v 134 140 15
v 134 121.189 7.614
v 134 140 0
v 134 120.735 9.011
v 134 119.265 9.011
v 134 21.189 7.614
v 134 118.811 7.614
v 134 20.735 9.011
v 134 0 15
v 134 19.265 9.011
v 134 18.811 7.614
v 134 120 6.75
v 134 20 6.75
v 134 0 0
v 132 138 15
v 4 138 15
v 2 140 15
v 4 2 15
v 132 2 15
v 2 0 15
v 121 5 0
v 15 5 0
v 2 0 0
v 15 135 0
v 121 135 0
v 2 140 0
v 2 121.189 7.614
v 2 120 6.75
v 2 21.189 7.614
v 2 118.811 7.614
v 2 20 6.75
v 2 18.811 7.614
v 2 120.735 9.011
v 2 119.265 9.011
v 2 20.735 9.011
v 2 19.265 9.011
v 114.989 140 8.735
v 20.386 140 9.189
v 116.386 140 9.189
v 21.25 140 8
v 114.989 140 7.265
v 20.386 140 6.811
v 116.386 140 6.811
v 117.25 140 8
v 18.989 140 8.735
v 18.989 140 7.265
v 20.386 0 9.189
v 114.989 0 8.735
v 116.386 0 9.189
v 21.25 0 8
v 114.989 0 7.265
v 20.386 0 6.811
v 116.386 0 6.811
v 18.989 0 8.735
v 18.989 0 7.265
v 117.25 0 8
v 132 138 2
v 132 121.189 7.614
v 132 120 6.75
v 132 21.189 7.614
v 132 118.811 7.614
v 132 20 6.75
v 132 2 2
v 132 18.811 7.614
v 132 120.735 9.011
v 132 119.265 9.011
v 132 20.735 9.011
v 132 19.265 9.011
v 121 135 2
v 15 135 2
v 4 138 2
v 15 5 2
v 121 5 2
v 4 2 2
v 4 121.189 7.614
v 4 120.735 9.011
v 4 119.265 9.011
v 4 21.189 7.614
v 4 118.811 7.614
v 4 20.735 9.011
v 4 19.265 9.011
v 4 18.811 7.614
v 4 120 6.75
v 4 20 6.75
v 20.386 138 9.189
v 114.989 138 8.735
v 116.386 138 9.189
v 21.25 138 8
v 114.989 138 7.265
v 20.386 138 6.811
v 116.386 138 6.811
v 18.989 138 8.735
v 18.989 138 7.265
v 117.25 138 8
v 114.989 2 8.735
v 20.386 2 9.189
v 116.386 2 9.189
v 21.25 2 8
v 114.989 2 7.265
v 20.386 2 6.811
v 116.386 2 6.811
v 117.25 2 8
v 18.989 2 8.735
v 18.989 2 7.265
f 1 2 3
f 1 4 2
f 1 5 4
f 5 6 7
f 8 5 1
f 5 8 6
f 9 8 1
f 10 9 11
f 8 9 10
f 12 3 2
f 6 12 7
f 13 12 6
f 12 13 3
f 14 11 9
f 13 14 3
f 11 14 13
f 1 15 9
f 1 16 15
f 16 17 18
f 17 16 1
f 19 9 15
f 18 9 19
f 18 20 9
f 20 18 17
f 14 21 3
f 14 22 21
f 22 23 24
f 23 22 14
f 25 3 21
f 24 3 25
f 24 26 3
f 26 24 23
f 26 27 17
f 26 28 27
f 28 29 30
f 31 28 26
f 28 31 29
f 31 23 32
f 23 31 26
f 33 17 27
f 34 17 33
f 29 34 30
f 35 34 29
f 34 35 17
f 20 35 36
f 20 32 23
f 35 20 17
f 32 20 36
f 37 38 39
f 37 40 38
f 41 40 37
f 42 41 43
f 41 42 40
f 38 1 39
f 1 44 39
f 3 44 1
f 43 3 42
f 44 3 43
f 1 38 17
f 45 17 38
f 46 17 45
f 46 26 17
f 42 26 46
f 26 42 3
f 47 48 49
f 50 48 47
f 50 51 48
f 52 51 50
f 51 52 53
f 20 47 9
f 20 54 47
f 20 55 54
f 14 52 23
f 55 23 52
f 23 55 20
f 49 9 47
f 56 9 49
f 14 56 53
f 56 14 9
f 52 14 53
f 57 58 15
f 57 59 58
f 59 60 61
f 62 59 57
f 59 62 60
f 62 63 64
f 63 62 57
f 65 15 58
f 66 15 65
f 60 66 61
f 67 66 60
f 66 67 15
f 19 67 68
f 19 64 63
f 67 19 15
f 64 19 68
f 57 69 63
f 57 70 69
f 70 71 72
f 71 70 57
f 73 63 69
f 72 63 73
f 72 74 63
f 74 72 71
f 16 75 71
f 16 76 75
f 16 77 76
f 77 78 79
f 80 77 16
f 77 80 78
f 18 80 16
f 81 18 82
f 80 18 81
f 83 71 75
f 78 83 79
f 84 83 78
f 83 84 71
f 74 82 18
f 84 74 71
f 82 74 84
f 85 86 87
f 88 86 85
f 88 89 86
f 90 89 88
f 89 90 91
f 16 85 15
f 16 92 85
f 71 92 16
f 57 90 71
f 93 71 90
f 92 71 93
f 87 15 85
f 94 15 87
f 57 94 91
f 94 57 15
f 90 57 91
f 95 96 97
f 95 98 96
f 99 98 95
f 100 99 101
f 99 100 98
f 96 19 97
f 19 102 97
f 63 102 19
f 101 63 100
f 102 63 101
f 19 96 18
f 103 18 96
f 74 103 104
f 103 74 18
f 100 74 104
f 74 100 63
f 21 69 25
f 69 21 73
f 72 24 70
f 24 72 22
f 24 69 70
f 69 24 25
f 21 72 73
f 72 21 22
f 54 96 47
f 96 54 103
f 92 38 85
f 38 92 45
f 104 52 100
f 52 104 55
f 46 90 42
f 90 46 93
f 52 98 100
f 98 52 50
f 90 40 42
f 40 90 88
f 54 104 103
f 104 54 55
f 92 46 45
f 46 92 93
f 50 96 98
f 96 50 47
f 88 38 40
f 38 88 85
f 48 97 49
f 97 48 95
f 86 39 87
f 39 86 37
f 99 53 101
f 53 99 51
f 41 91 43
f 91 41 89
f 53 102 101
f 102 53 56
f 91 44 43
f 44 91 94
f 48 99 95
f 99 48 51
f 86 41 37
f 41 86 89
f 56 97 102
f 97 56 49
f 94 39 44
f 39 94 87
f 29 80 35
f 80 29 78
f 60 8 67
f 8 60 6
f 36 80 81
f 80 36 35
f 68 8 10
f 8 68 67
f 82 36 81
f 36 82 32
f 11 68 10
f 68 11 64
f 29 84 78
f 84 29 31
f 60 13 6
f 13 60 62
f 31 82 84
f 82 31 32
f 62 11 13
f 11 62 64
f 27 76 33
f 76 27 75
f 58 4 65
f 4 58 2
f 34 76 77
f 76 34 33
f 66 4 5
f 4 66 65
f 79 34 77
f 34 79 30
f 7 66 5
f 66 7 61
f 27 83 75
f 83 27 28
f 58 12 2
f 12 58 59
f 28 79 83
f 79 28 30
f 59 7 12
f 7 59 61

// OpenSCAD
difference(){
translate([2,0,0])cube([132,140,15]);
translate([4,2,2])cube([128,136,17]);
translate([15,5,-1])cube([106,130,17]);
translate([20,0,8])
rotate([-90,0,0])cylinder(d=2.5,h=200);
translate([116,0,8])
rotate([-90,0,0])cylinder(d=2.5,h=200);
translate([0,20,8])
rotate([0,90,0])cylinder(d=2.5,h=200);
translate([0,120,8])
rotate([0,90,0])cylinder(d=2.5,h=200);
}
